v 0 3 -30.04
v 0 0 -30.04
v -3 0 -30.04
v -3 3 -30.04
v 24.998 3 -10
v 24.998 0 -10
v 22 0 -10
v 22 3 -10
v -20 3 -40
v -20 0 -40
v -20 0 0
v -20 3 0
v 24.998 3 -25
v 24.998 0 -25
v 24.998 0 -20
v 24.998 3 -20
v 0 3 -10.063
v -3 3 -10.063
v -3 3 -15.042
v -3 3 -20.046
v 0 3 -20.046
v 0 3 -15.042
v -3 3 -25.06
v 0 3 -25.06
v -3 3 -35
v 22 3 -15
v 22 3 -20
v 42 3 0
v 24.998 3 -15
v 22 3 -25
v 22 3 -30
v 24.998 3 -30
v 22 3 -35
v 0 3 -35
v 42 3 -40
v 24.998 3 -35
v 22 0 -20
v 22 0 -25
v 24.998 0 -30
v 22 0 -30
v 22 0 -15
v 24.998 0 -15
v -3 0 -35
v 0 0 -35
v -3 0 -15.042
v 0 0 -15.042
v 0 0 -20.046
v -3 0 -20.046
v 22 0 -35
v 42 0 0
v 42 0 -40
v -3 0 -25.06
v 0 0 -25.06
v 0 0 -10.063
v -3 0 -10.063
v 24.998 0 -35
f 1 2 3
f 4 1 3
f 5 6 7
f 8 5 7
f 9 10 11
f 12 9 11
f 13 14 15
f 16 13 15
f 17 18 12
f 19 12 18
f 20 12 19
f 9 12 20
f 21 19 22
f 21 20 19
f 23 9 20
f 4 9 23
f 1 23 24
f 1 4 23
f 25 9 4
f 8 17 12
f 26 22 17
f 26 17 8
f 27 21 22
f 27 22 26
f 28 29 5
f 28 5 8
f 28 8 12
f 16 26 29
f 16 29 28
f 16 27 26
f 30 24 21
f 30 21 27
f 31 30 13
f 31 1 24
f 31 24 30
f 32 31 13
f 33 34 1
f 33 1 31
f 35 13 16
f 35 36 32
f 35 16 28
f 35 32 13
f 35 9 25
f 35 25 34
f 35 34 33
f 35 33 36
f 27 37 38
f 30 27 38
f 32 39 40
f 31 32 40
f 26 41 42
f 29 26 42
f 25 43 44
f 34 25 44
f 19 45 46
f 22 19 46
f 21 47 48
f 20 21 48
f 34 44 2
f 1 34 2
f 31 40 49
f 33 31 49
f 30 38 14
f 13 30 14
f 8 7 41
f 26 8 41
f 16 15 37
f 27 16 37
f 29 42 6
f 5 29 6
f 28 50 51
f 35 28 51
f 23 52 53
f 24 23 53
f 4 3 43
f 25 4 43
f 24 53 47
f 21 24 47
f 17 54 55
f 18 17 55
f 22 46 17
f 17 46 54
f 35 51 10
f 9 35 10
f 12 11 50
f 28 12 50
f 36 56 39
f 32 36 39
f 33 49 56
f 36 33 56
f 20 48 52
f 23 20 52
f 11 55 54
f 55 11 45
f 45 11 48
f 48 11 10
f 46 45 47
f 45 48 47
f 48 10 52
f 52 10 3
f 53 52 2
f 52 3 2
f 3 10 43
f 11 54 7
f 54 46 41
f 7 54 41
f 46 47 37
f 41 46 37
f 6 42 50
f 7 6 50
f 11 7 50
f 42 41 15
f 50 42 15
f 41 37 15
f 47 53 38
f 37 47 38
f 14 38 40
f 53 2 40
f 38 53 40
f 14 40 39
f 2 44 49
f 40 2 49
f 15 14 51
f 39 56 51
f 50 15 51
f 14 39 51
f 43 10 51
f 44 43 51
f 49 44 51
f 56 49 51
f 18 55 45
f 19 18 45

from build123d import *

# Parameters (mm, degrees)
BOSS_EXTRUDE1_DEPTH = 3


with BuildPart() as part:
    # Sketch1 → Boss-Extrude1 (new body)
    with BuildSketch(Plane(origin=(0, 0, 0), x_dir=(1, 0, 0), z_dir=(0, 1, 0))):
        Polygon((0, 10.062770525), (0, 0), (11, 0), (11, 40), (0, 40), (0, 35), (0, 30.039695182), (0, 25.060174836), (0, 20.045653409), (0, 15.041922169), align=None)
        Polygon((-20, 0), (0, 0), (0, 10.062770525), (-3, 10.062770525), (-3, 15.041922169), (0, 15.041922169), (0, 20.045653409), (-3, 20.045653409), (-3, 25.060174836), (0, 25.060174836), (0, 30.039695182), (-3, 30.039695182), (-3, 35), (0, 35), (0, 40), (-20, 40), align=None)
        Polygon((11, 40), (11, 0), (22, 0), (22, 10), (22, 15), (22, 20), (22, 25), (22, 30), (22, 35), (22, 40), align=None)
        Polygon((22, 10), (22, 0), (42, 0), (42, 40), (22, 40), (22, 35), (24.998112264, 35), (24.998112264, 30), (22, 30), (22, 25), (24.998112264, 25), (24.998112264, 20), (22, 20), (22, 15), (24.998112264, 15), (24.998112264, 10), align=None)
    extrude(amount=BOSS_EXTRUDE1_DEPTH)


solid = part.part
